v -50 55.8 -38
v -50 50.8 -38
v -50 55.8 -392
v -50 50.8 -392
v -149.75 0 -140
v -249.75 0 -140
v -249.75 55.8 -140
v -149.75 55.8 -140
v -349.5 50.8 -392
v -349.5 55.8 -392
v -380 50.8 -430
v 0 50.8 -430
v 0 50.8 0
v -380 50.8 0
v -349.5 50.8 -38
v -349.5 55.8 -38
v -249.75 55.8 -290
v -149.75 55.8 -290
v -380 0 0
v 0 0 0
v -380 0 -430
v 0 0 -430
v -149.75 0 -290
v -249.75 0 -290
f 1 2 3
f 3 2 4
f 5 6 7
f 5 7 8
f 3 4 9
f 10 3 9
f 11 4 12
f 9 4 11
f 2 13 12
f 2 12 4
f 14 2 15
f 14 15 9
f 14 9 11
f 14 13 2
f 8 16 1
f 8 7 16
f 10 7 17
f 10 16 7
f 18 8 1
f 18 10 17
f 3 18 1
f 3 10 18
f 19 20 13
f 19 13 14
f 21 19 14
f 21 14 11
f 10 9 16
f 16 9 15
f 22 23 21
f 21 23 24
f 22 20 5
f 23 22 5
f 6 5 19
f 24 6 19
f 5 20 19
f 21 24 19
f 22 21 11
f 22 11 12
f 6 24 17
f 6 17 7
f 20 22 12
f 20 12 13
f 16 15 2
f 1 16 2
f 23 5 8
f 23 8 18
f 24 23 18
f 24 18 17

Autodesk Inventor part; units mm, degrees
ref_plane "YZ Plane" through (0, 0, 0) normal (1, 0, 0) x (0, 1, 0)
ref_plane "XZ Plane" through (0, 0, 0) normal (0, 1, 0) x (-1, 0, 0)
ref_plane "XY Plane" through (0, 0, 0) normal (0, 0, 1) x (1, 0, 0)
sketch "Sketch1" plane through (0, 0, 0) normal (0, 1, 0) x (-1, 0, 0)
  line L0 (0, 0) -> (380, 0)
  line L1 (380, 0) -> (380, -430)
  line L2 (380, -430) -> (0, -430)
  line L3 (0, -430) -> (0, 0)
  line L4 (249.75, -140) -> (149.75, -140)
  line L5 (149.75, -140) -> (149.75, -290)
  line L6 (149.75, -290) -> (249.75, -290)
  line L7 (249.75, -290) -> (249.75, -140)
  dimension "d0" = 380
  dimension "d1" = 430
  dimension "d2" = 100
  dimension "d3" = 150
  dimension "d4" = 140
  dimension "d5" = 149.75
extrude "Extrusion1" add sketch "Sketch1" along normal blind 50.8
sketch "Sketch5" plane through (0, 50.8, 0) normal (0, 1, 0) x (1, 0, 0)
  line L0 (-349.5, 38) -> (-50, 38)
  line L1 (-50, 38) -> (-50, 392)
  line L2 (-50, 392) -> (-349.5, 392)
  line L3 (-349.5, 392) -> (-349.5, 38)
  line L4 (-380, 0) -> (0, 0) projected
  line L5 (-380, 430) -> (-380, 0) projected
  line L6 (-249.75, 140) -> (-149.75, 140) projected
  line L7 (-149.75, 290) -> (-249.75, 290) projected
  line L8 (-249.75, 140) -> (-149.75, 140)
  line L9 (-149.75, 140) -> (-149.75, 290)
  line L10 (-149.75, 290) -> (-249.75, 290)
  line L11 (-249.75, 290) -> (-249.75, 140)
  dimension "d14" = 299.5
  dimension "d15" = 354
  dimension "d16" = 38
  dimension "d17" = 30.5
extrude "Extrusion2" add sketch "Sketch5" along normal blind 5
properties part number "TapaFrontal"
